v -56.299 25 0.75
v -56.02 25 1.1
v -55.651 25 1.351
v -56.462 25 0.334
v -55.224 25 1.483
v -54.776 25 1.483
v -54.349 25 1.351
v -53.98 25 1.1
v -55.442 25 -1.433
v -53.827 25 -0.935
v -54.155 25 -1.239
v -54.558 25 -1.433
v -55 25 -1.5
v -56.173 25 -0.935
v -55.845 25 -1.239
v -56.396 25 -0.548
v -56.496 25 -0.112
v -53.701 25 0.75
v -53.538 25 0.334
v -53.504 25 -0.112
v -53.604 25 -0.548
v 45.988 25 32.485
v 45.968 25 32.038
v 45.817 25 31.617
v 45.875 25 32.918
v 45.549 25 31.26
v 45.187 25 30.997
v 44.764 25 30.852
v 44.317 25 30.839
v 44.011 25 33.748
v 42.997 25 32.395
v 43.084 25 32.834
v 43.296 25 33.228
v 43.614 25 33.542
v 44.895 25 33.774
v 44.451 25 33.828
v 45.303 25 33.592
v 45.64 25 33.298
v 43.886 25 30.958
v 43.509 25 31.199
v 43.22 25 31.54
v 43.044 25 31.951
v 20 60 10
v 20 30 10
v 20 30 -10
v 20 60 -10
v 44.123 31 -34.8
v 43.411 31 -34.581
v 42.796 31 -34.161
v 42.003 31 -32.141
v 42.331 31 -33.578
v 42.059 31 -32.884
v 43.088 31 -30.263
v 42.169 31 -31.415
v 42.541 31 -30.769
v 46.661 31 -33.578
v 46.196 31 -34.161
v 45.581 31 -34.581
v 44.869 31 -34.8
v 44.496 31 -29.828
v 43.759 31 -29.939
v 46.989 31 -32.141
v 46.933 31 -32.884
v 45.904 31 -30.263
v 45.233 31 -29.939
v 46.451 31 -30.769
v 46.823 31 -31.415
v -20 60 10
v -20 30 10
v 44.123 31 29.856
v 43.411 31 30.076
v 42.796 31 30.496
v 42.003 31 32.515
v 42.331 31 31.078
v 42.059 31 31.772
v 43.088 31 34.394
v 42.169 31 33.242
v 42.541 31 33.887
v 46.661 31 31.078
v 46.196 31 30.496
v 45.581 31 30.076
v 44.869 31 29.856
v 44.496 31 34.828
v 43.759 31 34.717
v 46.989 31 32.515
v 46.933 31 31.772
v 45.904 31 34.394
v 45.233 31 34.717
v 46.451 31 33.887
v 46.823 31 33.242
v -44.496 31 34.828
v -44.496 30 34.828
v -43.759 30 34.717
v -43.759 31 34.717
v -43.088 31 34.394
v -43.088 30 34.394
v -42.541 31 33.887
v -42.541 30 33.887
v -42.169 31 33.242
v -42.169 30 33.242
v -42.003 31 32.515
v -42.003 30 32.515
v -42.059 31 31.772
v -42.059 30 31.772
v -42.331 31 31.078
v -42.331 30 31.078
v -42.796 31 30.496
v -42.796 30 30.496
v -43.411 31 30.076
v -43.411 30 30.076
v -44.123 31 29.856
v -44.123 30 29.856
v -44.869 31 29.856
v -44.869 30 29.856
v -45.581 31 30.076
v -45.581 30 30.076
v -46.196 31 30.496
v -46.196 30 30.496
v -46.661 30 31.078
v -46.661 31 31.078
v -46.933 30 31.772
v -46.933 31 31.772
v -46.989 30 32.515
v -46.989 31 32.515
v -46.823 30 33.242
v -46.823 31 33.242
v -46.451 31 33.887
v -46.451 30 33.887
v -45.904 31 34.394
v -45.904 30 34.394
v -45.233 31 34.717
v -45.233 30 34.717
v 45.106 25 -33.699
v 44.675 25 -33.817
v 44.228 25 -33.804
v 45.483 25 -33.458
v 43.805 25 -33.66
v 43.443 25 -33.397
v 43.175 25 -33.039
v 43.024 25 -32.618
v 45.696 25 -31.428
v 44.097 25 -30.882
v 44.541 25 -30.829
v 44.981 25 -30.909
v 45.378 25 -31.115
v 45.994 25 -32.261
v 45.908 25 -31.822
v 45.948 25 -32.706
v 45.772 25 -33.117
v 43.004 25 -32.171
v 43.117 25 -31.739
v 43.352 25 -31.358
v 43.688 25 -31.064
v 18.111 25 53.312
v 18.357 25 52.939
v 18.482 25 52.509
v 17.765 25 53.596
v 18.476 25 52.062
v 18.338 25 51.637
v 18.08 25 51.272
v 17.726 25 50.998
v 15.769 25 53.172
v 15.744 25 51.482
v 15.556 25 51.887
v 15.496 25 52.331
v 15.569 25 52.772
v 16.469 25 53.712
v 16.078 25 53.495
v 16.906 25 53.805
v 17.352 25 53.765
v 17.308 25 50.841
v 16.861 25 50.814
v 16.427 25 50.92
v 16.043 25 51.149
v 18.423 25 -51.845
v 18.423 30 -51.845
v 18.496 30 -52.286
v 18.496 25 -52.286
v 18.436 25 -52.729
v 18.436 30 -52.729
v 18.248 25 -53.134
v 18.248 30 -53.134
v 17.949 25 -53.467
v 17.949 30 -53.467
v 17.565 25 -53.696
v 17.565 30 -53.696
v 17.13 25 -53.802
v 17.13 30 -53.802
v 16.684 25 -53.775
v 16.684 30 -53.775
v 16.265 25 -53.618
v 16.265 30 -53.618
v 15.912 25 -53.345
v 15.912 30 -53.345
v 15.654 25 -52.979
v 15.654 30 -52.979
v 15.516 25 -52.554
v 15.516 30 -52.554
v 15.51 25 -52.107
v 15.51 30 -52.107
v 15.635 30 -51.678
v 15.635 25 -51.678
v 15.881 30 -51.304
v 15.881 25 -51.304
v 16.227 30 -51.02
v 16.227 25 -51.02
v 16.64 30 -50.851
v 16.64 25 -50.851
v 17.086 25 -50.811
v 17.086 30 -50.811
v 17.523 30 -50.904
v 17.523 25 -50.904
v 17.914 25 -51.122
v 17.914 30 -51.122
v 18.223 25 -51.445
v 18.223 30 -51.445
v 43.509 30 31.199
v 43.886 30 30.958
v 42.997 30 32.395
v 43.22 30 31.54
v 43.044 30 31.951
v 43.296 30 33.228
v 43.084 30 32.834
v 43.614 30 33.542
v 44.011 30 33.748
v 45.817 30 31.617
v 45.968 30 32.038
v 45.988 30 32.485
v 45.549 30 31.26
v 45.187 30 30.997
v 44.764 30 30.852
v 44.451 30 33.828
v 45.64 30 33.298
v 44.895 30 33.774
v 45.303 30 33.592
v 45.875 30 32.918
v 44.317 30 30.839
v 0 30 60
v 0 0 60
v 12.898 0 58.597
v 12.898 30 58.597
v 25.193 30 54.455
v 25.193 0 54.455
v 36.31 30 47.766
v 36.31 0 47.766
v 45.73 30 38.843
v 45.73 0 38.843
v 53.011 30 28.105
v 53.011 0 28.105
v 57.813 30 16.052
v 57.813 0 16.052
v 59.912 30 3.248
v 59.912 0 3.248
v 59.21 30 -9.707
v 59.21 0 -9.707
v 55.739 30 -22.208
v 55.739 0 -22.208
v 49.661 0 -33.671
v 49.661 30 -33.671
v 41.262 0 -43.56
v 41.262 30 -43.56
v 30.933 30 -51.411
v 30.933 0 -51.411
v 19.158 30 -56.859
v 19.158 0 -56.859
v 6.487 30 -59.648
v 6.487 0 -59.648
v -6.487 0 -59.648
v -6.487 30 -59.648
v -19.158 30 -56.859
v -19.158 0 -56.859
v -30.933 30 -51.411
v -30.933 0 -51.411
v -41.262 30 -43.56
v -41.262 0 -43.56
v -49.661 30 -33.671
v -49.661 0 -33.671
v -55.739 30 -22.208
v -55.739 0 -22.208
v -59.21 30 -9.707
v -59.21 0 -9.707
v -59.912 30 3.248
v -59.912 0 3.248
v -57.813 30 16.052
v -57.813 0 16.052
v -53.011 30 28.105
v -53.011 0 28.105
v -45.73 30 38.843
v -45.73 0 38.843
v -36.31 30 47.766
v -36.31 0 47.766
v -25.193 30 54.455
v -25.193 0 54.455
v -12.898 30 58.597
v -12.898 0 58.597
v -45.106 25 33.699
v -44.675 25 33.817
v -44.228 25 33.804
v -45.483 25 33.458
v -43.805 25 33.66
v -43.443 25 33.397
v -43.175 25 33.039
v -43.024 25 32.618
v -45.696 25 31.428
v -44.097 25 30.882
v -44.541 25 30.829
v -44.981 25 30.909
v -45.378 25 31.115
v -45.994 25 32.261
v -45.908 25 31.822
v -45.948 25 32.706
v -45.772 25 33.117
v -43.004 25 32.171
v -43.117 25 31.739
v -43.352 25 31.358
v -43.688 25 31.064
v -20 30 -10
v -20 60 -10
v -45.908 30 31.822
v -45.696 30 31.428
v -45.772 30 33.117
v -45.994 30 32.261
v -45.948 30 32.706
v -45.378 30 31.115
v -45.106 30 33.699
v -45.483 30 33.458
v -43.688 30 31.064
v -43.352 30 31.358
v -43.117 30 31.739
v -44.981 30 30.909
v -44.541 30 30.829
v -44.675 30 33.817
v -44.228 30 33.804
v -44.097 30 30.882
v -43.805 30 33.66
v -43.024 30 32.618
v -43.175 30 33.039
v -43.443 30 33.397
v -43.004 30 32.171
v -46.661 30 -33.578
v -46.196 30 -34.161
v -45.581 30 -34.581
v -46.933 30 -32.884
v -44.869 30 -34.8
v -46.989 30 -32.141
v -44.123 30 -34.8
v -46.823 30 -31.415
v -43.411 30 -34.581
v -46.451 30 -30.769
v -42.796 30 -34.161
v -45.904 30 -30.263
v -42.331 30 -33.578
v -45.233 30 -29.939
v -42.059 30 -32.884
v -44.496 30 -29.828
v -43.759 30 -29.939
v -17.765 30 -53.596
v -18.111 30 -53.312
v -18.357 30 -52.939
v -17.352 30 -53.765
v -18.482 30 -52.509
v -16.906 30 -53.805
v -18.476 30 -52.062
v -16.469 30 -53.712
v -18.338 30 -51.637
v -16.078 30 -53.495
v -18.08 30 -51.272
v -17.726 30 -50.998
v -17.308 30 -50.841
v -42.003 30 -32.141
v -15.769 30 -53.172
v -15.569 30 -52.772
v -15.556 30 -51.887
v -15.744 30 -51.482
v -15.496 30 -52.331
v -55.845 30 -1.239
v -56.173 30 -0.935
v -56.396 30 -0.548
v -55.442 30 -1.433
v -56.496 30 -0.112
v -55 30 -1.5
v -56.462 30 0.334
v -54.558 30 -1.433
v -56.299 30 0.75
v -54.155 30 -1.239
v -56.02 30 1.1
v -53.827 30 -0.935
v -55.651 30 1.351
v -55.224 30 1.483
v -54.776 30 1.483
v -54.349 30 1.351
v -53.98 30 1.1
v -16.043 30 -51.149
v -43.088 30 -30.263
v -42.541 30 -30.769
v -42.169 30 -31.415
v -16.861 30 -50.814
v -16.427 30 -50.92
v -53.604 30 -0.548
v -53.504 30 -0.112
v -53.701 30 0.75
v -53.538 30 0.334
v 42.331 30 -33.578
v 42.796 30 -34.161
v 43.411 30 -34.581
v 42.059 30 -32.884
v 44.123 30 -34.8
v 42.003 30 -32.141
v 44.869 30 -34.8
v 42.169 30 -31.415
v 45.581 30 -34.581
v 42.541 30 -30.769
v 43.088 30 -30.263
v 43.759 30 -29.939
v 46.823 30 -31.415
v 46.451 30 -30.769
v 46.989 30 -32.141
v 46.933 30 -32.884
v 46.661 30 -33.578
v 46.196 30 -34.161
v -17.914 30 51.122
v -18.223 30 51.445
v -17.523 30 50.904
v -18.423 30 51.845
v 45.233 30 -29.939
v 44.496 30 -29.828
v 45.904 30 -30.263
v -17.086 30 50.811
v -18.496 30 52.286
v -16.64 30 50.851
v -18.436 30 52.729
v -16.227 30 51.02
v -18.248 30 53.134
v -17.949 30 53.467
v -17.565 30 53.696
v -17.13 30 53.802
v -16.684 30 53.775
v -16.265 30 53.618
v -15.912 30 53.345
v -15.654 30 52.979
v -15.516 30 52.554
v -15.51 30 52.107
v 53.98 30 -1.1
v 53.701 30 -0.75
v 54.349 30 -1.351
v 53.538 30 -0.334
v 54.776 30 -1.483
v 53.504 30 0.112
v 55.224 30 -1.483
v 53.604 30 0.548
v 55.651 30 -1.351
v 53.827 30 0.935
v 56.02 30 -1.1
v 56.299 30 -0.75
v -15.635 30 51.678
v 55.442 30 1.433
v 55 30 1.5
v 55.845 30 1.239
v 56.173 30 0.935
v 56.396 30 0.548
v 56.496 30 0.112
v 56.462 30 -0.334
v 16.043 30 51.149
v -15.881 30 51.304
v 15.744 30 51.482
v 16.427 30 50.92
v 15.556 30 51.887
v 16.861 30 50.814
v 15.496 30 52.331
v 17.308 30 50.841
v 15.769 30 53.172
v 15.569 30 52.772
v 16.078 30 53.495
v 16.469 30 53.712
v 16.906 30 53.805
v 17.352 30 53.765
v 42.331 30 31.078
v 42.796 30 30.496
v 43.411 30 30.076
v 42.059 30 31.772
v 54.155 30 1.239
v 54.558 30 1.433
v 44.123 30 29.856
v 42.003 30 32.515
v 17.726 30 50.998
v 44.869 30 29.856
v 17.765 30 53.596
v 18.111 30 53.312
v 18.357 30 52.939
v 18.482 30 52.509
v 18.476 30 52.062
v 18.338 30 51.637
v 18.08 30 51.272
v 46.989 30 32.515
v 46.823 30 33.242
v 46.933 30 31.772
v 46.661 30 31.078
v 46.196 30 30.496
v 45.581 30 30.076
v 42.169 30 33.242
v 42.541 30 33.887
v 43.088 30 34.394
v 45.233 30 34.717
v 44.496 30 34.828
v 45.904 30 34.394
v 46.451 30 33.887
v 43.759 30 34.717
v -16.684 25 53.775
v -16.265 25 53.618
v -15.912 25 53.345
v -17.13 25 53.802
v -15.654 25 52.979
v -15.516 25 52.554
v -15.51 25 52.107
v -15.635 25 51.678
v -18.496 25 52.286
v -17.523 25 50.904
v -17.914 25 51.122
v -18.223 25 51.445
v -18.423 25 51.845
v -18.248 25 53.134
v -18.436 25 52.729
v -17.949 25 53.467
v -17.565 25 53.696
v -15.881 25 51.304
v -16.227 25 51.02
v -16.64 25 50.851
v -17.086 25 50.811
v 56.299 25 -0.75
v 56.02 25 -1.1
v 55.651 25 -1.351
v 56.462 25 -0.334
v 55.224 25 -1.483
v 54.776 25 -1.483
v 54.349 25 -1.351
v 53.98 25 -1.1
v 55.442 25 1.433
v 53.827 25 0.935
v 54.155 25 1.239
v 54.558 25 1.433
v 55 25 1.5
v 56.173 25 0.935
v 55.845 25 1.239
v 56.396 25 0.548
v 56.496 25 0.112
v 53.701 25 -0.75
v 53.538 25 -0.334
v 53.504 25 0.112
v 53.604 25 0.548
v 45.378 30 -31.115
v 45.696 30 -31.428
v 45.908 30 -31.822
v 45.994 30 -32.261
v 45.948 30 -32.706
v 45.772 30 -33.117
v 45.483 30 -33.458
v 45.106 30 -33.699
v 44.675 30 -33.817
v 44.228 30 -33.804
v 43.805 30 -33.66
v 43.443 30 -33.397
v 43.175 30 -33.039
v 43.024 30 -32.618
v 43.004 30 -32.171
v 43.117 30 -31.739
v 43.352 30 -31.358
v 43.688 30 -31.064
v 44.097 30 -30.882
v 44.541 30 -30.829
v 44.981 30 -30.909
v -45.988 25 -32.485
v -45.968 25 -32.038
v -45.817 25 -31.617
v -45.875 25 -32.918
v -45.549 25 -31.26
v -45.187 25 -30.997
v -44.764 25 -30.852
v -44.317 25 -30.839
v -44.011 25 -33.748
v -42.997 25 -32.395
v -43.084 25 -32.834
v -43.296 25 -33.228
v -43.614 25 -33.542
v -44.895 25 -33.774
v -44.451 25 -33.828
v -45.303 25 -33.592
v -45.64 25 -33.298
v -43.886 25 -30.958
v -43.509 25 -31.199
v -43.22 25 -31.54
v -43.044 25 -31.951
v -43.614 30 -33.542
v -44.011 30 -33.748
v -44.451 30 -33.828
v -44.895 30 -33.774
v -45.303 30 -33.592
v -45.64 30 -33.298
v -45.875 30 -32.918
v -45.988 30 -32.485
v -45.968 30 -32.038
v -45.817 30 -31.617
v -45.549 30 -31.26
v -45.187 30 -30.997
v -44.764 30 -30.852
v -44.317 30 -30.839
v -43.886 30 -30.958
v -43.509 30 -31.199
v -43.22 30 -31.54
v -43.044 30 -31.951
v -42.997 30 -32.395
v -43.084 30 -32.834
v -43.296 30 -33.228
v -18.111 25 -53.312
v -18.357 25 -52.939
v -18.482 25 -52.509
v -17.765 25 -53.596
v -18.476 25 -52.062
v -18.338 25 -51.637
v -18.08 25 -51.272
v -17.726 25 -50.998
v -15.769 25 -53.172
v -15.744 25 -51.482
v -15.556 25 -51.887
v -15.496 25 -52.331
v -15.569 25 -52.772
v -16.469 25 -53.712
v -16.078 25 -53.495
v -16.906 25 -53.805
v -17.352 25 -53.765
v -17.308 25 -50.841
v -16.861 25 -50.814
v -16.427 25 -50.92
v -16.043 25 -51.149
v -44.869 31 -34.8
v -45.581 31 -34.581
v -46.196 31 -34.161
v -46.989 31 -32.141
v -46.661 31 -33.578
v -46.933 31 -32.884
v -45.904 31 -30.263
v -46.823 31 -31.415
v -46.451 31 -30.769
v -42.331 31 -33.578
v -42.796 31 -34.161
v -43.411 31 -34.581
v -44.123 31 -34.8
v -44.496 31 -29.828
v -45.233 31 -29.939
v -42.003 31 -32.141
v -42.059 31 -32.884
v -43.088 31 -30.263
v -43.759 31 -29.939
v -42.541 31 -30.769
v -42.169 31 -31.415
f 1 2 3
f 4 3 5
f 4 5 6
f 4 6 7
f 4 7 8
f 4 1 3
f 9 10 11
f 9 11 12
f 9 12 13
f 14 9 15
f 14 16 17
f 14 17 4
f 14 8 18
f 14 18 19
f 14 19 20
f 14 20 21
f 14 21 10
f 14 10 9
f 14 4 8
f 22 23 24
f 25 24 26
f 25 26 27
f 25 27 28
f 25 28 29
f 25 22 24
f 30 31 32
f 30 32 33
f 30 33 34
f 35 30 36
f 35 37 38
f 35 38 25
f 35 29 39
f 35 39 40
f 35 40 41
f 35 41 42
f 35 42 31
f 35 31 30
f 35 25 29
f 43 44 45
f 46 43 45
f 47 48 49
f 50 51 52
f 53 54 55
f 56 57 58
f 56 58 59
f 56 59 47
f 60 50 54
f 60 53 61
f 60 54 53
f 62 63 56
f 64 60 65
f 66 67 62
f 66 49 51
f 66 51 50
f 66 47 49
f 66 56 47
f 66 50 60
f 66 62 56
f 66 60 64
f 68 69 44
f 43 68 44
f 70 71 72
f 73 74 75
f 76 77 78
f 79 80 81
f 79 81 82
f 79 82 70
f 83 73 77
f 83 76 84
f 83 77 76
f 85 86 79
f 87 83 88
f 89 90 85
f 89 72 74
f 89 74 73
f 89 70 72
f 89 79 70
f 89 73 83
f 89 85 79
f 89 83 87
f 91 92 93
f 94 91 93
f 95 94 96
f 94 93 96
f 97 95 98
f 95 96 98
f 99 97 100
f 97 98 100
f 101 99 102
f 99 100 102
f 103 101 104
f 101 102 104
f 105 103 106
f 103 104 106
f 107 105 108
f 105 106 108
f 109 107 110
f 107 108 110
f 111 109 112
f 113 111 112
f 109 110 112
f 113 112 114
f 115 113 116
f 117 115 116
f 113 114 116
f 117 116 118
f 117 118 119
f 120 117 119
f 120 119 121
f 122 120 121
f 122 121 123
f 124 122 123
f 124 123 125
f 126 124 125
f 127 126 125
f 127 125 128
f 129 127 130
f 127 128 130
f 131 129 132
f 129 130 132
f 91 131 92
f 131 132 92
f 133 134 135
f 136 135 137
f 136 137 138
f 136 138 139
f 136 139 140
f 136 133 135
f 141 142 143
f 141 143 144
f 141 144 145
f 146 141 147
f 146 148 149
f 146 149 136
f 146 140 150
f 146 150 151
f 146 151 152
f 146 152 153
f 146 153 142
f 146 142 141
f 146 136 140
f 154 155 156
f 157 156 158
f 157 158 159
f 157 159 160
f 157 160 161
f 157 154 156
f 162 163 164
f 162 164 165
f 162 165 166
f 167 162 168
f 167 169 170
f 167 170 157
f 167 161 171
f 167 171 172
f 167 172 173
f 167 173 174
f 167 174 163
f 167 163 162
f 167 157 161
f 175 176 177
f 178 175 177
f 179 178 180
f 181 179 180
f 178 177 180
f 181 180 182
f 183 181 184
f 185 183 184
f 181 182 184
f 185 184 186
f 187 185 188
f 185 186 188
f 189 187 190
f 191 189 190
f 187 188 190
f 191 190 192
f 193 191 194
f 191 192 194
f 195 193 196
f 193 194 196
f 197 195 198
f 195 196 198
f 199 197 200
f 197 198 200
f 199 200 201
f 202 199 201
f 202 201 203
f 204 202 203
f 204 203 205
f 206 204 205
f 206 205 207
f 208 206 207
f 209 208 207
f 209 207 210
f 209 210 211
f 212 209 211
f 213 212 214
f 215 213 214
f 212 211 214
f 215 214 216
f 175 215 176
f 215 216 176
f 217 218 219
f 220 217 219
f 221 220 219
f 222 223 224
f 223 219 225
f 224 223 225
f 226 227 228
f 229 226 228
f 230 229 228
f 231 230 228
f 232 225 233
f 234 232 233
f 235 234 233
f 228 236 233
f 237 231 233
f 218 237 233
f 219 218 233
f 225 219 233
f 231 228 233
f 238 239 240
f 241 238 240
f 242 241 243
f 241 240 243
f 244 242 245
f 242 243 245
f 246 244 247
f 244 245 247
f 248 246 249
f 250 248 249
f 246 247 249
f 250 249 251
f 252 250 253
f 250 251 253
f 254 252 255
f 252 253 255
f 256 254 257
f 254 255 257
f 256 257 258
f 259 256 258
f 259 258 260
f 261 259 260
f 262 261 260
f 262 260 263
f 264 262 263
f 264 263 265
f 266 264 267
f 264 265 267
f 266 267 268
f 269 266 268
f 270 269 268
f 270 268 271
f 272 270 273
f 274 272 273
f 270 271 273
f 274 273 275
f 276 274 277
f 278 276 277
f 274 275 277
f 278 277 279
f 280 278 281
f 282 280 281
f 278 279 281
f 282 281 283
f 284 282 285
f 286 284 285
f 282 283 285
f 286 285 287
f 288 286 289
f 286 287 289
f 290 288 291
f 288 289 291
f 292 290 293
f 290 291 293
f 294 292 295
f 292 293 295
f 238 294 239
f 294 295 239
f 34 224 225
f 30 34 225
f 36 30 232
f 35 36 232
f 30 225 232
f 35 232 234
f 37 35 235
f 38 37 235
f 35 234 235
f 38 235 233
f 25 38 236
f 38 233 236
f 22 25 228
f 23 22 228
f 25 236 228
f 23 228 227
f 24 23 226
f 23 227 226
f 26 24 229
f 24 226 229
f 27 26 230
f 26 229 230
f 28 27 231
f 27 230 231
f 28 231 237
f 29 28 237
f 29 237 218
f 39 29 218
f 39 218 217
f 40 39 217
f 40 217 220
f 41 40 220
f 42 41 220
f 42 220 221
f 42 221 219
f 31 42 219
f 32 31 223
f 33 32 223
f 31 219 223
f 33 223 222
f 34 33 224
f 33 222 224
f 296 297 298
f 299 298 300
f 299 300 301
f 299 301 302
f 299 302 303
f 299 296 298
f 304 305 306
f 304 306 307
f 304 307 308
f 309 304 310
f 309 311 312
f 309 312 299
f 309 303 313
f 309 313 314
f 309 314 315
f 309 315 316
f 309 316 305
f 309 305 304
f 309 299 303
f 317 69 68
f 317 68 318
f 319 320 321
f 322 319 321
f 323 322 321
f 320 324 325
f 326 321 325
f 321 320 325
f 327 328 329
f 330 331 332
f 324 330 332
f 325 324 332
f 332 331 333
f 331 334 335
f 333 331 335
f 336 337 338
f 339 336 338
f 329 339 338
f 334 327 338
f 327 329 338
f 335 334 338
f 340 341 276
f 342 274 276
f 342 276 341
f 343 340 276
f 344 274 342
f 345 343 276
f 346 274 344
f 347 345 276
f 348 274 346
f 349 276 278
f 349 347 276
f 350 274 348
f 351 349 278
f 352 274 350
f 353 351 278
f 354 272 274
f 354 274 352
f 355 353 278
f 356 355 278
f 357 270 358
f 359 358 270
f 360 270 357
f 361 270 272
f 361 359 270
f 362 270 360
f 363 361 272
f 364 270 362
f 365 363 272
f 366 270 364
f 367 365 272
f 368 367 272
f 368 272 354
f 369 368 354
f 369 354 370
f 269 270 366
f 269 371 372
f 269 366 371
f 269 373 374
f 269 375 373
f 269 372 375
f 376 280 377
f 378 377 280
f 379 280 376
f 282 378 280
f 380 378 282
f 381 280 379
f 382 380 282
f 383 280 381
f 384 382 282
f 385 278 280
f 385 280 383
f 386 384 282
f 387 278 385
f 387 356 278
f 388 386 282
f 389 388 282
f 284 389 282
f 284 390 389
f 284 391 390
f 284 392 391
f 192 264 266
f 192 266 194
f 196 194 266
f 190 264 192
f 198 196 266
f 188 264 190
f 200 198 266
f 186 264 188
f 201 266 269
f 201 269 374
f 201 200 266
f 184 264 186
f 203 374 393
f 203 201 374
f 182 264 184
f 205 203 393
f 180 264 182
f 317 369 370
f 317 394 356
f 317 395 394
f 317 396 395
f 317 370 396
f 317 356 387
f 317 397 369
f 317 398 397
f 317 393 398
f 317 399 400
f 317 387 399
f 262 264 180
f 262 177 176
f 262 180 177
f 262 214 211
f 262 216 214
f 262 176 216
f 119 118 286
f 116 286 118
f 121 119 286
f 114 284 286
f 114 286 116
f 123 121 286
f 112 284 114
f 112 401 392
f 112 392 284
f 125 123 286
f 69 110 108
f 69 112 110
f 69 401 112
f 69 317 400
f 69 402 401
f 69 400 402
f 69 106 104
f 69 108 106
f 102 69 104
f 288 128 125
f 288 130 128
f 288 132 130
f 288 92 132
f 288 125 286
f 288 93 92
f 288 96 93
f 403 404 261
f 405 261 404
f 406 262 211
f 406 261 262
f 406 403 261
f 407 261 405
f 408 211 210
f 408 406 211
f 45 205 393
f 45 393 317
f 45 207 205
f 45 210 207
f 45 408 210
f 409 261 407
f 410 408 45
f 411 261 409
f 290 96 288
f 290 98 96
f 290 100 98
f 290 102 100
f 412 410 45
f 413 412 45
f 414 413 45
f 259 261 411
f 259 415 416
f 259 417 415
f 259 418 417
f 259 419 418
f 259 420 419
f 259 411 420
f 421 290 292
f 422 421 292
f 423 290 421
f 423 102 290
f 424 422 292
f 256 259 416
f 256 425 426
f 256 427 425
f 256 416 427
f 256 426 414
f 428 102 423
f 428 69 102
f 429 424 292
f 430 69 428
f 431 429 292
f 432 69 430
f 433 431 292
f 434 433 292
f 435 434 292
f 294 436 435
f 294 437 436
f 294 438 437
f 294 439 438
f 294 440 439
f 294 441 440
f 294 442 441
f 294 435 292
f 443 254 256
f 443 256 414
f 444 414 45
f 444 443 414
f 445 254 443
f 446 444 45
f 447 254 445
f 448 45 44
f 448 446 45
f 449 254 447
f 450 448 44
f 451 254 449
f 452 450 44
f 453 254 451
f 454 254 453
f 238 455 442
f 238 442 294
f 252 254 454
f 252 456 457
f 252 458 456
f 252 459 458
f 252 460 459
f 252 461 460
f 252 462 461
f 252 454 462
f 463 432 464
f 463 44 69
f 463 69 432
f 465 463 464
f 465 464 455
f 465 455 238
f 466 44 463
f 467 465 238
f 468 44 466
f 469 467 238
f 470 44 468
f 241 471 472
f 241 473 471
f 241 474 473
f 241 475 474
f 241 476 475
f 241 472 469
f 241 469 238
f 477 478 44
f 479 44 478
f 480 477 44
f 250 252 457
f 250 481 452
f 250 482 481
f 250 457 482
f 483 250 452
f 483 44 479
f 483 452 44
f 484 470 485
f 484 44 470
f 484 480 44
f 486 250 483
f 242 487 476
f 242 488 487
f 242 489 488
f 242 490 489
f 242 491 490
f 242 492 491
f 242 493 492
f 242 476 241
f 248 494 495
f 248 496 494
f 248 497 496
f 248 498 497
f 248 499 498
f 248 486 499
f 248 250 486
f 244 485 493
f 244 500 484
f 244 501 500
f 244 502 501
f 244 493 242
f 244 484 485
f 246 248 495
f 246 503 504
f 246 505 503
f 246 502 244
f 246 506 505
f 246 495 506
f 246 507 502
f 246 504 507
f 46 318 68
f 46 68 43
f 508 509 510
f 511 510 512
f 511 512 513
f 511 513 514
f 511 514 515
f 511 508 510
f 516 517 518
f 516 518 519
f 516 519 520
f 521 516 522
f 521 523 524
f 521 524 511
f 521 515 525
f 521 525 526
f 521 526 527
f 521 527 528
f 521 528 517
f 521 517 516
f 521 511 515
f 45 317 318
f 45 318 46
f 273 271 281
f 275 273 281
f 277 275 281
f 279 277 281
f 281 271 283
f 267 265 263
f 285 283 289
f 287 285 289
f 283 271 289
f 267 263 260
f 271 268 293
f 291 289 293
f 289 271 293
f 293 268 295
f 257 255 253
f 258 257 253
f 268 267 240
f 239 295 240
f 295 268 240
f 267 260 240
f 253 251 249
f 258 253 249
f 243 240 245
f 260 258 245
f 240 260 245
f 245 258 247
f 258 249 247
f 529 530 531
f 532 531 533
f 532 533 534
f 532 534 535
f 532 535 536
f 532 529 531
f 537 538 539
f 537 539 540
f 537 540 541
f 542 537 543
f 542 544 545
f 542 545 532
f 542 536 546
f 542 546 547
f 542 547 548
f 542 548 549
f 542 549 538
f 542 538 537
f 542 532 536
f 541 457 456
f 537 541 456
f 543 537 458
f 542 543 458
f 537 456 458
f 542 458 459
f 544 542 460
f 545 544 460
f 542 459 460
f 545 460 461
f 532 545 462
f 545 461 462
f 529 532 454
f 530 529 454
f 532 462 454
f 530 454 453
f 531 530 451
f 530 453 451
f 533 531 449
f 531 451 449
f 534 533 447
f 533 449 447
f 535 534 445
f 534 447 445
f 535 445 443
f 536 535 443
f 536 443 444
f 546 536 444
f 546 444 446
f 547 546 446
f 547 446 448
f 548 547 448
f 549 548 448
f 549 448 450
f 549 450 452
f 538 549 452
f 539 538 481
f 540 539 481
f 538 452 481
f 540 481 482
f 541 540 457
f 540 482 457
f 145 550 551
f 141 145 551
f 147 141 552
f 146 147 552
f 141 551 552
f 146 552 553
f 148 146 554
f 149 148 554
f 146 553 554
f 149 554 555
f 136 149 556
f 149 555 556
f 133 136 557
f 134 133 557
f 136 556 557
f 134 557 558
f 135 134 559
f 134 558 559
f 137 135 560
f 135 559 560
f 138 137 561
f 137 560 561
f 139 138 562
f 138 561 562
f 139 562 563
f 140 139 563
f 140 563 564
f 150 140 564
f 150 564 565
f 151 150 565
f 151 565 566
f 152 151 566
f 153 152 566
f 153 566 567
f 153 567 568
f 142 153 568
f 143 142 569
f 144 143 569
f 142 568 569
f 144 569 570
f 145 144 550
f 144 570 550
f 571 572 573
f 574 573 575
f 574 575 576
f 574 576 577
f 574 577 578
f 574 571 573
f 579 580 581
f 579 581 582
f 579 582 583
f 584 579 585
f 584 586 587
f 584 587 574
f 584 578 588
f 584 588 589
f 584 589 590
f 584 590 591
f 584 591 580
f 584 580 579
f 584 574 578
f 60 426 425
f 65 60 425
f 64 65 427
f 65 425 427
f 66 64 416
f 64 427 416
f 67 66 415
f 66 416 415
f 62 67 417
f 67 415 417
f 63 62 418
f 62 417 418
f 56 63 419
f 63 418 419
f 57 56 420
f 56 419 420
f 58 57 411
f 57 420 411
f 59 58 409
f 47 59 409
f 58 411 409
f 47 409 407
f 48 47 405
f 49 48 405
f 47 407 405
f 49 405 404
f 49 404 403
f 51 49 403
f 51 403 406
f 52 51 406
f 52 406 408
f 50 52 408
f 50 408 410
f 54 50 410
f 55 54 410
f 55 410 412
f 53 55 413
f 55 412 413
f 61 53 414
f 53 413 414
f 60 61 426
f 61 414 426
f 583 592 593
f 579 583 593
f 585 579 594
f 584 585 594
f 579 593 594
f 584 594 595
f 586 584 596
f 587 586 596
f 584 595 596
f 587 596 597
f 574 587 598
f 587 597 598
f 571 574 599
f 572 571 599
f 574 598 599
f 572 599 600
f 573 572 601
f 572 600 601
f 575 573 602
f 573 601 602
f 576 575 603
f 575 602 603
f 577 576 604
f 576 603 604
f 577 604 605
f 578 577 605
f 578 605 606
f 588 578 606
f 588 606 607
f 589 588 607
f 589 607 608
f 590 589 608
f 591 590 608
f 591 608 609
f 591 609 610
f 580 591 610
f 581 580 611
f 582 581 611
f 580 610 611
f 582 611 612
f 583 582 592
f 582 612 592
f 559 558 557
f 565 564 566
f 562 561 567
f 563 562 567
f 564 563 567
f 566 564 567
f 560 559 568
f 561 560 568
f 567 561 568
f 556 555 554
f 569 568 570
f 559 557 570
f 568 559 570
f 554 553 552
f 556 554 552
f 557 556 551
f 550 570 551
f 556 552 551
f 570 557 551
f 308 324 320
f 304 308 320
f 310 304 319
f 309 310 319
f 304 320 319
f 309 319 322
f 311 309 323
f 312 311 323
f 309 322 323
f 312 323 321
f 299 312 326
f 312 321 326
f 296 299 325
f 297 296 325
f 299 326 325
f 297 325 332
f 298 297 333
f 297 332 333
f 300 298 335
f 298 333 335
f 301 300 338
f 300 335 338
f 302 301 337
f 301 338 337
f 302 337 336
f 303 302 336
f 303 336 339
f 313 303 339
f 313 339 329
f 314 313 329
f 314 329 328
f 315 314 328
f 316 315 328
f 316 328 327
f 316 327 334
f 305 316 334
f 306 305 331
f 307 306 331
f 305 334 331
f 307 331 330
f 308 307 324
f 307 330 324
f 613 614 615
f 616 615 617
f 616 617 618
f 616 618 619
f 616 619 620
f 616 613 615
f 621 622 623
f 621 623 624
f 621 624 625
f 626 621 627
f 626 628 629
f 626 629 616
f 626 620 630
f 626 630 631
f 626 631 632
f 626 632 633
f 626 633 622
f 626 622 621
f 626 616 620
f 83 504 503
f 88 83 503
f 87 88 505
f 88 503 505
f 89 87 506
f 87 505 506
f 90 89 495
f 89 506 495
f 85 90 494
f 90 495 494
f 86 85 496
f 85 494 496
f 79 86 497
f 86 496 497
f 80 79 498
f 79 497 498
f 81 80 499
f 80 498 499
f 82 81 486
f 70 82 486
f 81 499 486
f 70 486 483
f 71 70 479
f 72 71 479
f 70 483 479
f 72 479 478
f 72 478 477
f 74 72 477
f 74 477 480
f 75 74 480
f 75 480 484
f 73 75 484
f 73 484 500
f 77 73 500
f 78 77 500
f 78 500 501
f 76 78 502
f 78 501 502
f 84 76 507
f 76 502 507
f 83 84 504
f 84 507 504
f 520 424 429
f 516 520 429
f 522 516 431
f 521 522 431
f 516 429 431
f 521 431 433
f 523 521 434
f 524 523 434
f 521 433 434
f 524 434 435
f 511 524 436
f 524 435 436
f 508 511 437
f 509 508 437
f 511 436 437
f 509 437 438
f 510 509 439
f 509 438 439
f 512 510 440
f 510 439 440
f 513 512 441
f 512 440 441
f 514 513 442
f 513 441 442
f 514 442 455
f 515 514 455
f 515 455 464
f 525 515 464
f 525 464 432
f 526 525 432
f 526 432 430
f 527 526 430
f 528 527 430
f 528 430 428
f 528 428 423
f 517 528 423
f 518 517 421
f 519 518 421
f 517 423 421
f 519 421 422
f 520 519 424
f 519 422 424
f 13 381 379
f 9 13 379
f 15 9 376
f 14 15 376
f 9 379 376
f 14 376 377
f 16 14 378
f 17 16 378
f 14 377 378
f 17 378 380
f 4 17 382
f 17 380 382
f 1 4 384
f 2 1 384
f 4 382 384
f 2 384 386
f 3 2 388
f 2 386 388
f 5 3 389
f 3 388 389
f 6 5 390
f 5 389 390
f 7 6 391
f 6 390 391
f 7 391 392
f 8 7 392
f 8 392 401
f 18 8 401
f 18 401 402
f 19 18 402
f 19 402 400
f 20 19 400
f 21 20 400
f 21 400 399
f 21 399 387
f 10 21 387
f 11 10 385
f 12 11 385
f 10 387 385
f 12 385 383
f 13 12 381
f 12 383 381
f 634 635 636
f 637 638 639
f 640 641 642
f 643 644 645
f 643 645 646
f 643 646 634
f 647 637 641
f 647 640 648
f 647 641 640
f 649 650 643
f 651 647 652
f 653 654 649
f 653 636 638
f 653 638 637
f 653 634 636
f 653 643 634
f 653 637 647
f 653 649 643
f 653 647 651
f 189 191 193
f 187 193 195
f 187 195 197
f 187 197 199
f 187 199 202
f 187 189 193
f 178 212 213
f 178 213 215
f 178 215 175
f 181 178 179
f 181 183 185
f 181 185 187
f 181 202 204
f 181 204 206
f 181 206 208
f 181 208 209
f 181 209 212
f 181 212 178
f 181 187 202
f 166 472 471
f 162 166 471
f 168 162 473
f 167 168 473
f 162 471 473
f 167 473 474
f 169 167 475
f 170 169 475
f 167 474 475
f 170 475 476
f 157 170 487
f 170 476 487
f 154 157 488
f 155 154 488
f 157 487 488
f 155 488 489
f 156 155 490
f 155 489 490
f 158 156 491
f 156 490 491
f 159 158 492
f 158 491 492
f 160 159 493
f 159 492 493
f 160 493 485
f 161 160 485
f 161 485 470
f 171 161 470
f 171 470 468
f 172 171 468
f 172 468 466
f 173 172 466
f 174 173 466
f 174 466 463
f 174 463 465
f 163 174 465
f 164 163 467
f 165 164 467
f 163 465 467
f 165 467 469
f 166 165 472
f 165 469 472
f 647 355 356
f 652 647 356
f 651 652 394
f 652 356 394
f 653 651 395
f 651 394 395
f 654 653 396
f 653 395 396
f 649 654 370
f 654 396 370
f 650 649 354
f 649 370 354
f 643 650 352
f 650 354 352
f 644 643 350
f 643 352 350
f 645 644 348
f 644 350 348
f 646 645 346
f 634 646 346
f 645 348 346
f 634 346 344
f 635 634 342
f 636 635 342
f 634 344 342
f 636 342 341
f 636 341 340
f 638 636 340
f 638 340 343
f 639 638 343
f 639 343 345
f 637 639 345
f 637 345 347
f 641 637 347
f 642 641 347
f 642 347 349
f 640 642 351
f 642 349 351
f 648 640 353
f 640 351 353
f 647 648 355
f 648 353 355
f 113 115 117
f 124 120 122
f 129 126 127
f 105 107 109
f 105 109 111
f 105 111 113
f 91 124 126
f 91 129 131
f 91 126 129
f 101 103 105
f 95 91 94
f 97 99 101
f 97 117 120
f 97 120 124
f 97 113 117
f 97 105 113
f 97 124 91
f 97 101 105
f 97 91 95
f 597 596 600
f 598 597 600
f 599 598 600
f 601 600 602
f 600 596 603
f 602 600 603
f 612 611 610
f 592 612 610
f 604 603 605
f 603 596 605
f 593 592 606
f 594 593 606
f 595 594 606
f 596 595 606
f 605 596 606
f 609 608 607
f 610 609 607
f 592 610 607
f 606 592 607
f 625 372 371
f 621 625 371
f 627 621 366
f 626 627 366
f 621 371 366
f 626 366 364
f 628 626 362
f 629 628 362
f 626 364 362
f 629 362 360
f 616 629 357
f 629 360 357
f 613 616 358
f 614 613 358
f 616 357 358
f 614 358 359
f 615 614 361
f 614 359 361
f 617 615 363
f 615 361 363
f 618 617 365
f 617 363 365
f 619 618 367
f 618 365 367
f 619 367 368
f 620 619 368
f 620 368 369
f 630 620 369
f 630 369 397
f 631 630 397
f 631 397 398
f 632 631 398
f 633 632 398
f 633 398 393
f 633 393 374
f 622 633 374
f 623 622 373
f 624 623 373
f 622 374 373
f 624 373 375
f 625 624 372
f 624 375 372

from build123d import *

# Parameters (mm, degrees)
SKETCH_1_R               = 60
EXTRUDE_1_DEPTH          = 30
SKETCH_2_R               = 1.5
CUT_EXTRUDE_1_DEPTH      = 5
PATTERN_CIRCULAR_1_COUNT = 10
SKETCH_3_W               = 40
SKETCH_3_H               = 20
EXTRUDE_2_DEPTH          = 30
SKETCH_5_R               = 2.5
EXTRUDE_4_DEPTH          = 1


with BuildPart() as part:
    # 草图1 → 凸台-拉伸1 (new body)
    with BuildSketch(Plane(origin=(0, 0, 0), x_dir=(1, 0, 0), z_dir=(0, 1, 0))):
        with Locations(Location((0, 0, 0), (0, 0, 270))):
            Circle(SKETCH_1_R)
    extrude(amount=EXTRUDE_1_DEPTH)

    # 草图2 → 切除-拉伸1 (cut)
    with BuildSketch(Plane(origin=(0, 30, 0), x_dir=(1, 0, 0), z_dir=(0, 1, 0))):
        with Locations(Location((55, 0, 0), (0, 0, 270))):
            Circle(SKETCH_2_R)
    cut_extrude_1 = extrude(amount=-CUT_EXTRUDE_1_DEPTH, mode=Mode.SUBTRACT)

    # 阵列(圆周)1: 切除-拉伸1 ×10 about axis
    pattern_circular_1_axis = Axis((0, 0, 0), (0, 1, 0))
    for i in range(1, PATTERN_CIRCULAR_1_COUNT):
        add(cut_extrude_1.rotate(pattern_circular_1_axis, i * 360 / PATTERN_CIRCULAR_1_COUNT), mode=Mode.SUBTRACT)

    # 草图3 → 凸台-拉伸2 (add)
    with BuildSketch(Plane(origin=(0, 30, 0), x_dir=(1, 0, 0), z_dir=(0, 1, 0))):
        Rectangle(SKETCH_3_W, SKETCH_3_H)
    extrude(amount=EXTRUDE_2_DEPTH)

    # 草图5 → 凸台-拉伸4 (add)
    with BuildSketch(Plane(origin=(0, 30, 0), x_dir=(1, 0, 0), z_dir=(0, 1, 0))):
        with Locations(Location((-44.495934691, 32.328188876, 0), (0, 0, 270))):
            Circle(SKETCH_5_R)
        with Locations(Location((44.495934691, -32.328188876, 0), (0, 0, 270))):
            Circle(SKETCH_5_R)
        with Locations(Location((44.495934691, 32.328188876, 0), (0, 0, 270))):
            Circle(SKETCH_5_R)
        with Locations(Location((-44.495934691, -32.328188876, 0), (0, 0, 270))):
            Circle(SKETCH_5_R)
    extrude(amount=EXTRUDE_4_DEPTH)


solid = part.part
